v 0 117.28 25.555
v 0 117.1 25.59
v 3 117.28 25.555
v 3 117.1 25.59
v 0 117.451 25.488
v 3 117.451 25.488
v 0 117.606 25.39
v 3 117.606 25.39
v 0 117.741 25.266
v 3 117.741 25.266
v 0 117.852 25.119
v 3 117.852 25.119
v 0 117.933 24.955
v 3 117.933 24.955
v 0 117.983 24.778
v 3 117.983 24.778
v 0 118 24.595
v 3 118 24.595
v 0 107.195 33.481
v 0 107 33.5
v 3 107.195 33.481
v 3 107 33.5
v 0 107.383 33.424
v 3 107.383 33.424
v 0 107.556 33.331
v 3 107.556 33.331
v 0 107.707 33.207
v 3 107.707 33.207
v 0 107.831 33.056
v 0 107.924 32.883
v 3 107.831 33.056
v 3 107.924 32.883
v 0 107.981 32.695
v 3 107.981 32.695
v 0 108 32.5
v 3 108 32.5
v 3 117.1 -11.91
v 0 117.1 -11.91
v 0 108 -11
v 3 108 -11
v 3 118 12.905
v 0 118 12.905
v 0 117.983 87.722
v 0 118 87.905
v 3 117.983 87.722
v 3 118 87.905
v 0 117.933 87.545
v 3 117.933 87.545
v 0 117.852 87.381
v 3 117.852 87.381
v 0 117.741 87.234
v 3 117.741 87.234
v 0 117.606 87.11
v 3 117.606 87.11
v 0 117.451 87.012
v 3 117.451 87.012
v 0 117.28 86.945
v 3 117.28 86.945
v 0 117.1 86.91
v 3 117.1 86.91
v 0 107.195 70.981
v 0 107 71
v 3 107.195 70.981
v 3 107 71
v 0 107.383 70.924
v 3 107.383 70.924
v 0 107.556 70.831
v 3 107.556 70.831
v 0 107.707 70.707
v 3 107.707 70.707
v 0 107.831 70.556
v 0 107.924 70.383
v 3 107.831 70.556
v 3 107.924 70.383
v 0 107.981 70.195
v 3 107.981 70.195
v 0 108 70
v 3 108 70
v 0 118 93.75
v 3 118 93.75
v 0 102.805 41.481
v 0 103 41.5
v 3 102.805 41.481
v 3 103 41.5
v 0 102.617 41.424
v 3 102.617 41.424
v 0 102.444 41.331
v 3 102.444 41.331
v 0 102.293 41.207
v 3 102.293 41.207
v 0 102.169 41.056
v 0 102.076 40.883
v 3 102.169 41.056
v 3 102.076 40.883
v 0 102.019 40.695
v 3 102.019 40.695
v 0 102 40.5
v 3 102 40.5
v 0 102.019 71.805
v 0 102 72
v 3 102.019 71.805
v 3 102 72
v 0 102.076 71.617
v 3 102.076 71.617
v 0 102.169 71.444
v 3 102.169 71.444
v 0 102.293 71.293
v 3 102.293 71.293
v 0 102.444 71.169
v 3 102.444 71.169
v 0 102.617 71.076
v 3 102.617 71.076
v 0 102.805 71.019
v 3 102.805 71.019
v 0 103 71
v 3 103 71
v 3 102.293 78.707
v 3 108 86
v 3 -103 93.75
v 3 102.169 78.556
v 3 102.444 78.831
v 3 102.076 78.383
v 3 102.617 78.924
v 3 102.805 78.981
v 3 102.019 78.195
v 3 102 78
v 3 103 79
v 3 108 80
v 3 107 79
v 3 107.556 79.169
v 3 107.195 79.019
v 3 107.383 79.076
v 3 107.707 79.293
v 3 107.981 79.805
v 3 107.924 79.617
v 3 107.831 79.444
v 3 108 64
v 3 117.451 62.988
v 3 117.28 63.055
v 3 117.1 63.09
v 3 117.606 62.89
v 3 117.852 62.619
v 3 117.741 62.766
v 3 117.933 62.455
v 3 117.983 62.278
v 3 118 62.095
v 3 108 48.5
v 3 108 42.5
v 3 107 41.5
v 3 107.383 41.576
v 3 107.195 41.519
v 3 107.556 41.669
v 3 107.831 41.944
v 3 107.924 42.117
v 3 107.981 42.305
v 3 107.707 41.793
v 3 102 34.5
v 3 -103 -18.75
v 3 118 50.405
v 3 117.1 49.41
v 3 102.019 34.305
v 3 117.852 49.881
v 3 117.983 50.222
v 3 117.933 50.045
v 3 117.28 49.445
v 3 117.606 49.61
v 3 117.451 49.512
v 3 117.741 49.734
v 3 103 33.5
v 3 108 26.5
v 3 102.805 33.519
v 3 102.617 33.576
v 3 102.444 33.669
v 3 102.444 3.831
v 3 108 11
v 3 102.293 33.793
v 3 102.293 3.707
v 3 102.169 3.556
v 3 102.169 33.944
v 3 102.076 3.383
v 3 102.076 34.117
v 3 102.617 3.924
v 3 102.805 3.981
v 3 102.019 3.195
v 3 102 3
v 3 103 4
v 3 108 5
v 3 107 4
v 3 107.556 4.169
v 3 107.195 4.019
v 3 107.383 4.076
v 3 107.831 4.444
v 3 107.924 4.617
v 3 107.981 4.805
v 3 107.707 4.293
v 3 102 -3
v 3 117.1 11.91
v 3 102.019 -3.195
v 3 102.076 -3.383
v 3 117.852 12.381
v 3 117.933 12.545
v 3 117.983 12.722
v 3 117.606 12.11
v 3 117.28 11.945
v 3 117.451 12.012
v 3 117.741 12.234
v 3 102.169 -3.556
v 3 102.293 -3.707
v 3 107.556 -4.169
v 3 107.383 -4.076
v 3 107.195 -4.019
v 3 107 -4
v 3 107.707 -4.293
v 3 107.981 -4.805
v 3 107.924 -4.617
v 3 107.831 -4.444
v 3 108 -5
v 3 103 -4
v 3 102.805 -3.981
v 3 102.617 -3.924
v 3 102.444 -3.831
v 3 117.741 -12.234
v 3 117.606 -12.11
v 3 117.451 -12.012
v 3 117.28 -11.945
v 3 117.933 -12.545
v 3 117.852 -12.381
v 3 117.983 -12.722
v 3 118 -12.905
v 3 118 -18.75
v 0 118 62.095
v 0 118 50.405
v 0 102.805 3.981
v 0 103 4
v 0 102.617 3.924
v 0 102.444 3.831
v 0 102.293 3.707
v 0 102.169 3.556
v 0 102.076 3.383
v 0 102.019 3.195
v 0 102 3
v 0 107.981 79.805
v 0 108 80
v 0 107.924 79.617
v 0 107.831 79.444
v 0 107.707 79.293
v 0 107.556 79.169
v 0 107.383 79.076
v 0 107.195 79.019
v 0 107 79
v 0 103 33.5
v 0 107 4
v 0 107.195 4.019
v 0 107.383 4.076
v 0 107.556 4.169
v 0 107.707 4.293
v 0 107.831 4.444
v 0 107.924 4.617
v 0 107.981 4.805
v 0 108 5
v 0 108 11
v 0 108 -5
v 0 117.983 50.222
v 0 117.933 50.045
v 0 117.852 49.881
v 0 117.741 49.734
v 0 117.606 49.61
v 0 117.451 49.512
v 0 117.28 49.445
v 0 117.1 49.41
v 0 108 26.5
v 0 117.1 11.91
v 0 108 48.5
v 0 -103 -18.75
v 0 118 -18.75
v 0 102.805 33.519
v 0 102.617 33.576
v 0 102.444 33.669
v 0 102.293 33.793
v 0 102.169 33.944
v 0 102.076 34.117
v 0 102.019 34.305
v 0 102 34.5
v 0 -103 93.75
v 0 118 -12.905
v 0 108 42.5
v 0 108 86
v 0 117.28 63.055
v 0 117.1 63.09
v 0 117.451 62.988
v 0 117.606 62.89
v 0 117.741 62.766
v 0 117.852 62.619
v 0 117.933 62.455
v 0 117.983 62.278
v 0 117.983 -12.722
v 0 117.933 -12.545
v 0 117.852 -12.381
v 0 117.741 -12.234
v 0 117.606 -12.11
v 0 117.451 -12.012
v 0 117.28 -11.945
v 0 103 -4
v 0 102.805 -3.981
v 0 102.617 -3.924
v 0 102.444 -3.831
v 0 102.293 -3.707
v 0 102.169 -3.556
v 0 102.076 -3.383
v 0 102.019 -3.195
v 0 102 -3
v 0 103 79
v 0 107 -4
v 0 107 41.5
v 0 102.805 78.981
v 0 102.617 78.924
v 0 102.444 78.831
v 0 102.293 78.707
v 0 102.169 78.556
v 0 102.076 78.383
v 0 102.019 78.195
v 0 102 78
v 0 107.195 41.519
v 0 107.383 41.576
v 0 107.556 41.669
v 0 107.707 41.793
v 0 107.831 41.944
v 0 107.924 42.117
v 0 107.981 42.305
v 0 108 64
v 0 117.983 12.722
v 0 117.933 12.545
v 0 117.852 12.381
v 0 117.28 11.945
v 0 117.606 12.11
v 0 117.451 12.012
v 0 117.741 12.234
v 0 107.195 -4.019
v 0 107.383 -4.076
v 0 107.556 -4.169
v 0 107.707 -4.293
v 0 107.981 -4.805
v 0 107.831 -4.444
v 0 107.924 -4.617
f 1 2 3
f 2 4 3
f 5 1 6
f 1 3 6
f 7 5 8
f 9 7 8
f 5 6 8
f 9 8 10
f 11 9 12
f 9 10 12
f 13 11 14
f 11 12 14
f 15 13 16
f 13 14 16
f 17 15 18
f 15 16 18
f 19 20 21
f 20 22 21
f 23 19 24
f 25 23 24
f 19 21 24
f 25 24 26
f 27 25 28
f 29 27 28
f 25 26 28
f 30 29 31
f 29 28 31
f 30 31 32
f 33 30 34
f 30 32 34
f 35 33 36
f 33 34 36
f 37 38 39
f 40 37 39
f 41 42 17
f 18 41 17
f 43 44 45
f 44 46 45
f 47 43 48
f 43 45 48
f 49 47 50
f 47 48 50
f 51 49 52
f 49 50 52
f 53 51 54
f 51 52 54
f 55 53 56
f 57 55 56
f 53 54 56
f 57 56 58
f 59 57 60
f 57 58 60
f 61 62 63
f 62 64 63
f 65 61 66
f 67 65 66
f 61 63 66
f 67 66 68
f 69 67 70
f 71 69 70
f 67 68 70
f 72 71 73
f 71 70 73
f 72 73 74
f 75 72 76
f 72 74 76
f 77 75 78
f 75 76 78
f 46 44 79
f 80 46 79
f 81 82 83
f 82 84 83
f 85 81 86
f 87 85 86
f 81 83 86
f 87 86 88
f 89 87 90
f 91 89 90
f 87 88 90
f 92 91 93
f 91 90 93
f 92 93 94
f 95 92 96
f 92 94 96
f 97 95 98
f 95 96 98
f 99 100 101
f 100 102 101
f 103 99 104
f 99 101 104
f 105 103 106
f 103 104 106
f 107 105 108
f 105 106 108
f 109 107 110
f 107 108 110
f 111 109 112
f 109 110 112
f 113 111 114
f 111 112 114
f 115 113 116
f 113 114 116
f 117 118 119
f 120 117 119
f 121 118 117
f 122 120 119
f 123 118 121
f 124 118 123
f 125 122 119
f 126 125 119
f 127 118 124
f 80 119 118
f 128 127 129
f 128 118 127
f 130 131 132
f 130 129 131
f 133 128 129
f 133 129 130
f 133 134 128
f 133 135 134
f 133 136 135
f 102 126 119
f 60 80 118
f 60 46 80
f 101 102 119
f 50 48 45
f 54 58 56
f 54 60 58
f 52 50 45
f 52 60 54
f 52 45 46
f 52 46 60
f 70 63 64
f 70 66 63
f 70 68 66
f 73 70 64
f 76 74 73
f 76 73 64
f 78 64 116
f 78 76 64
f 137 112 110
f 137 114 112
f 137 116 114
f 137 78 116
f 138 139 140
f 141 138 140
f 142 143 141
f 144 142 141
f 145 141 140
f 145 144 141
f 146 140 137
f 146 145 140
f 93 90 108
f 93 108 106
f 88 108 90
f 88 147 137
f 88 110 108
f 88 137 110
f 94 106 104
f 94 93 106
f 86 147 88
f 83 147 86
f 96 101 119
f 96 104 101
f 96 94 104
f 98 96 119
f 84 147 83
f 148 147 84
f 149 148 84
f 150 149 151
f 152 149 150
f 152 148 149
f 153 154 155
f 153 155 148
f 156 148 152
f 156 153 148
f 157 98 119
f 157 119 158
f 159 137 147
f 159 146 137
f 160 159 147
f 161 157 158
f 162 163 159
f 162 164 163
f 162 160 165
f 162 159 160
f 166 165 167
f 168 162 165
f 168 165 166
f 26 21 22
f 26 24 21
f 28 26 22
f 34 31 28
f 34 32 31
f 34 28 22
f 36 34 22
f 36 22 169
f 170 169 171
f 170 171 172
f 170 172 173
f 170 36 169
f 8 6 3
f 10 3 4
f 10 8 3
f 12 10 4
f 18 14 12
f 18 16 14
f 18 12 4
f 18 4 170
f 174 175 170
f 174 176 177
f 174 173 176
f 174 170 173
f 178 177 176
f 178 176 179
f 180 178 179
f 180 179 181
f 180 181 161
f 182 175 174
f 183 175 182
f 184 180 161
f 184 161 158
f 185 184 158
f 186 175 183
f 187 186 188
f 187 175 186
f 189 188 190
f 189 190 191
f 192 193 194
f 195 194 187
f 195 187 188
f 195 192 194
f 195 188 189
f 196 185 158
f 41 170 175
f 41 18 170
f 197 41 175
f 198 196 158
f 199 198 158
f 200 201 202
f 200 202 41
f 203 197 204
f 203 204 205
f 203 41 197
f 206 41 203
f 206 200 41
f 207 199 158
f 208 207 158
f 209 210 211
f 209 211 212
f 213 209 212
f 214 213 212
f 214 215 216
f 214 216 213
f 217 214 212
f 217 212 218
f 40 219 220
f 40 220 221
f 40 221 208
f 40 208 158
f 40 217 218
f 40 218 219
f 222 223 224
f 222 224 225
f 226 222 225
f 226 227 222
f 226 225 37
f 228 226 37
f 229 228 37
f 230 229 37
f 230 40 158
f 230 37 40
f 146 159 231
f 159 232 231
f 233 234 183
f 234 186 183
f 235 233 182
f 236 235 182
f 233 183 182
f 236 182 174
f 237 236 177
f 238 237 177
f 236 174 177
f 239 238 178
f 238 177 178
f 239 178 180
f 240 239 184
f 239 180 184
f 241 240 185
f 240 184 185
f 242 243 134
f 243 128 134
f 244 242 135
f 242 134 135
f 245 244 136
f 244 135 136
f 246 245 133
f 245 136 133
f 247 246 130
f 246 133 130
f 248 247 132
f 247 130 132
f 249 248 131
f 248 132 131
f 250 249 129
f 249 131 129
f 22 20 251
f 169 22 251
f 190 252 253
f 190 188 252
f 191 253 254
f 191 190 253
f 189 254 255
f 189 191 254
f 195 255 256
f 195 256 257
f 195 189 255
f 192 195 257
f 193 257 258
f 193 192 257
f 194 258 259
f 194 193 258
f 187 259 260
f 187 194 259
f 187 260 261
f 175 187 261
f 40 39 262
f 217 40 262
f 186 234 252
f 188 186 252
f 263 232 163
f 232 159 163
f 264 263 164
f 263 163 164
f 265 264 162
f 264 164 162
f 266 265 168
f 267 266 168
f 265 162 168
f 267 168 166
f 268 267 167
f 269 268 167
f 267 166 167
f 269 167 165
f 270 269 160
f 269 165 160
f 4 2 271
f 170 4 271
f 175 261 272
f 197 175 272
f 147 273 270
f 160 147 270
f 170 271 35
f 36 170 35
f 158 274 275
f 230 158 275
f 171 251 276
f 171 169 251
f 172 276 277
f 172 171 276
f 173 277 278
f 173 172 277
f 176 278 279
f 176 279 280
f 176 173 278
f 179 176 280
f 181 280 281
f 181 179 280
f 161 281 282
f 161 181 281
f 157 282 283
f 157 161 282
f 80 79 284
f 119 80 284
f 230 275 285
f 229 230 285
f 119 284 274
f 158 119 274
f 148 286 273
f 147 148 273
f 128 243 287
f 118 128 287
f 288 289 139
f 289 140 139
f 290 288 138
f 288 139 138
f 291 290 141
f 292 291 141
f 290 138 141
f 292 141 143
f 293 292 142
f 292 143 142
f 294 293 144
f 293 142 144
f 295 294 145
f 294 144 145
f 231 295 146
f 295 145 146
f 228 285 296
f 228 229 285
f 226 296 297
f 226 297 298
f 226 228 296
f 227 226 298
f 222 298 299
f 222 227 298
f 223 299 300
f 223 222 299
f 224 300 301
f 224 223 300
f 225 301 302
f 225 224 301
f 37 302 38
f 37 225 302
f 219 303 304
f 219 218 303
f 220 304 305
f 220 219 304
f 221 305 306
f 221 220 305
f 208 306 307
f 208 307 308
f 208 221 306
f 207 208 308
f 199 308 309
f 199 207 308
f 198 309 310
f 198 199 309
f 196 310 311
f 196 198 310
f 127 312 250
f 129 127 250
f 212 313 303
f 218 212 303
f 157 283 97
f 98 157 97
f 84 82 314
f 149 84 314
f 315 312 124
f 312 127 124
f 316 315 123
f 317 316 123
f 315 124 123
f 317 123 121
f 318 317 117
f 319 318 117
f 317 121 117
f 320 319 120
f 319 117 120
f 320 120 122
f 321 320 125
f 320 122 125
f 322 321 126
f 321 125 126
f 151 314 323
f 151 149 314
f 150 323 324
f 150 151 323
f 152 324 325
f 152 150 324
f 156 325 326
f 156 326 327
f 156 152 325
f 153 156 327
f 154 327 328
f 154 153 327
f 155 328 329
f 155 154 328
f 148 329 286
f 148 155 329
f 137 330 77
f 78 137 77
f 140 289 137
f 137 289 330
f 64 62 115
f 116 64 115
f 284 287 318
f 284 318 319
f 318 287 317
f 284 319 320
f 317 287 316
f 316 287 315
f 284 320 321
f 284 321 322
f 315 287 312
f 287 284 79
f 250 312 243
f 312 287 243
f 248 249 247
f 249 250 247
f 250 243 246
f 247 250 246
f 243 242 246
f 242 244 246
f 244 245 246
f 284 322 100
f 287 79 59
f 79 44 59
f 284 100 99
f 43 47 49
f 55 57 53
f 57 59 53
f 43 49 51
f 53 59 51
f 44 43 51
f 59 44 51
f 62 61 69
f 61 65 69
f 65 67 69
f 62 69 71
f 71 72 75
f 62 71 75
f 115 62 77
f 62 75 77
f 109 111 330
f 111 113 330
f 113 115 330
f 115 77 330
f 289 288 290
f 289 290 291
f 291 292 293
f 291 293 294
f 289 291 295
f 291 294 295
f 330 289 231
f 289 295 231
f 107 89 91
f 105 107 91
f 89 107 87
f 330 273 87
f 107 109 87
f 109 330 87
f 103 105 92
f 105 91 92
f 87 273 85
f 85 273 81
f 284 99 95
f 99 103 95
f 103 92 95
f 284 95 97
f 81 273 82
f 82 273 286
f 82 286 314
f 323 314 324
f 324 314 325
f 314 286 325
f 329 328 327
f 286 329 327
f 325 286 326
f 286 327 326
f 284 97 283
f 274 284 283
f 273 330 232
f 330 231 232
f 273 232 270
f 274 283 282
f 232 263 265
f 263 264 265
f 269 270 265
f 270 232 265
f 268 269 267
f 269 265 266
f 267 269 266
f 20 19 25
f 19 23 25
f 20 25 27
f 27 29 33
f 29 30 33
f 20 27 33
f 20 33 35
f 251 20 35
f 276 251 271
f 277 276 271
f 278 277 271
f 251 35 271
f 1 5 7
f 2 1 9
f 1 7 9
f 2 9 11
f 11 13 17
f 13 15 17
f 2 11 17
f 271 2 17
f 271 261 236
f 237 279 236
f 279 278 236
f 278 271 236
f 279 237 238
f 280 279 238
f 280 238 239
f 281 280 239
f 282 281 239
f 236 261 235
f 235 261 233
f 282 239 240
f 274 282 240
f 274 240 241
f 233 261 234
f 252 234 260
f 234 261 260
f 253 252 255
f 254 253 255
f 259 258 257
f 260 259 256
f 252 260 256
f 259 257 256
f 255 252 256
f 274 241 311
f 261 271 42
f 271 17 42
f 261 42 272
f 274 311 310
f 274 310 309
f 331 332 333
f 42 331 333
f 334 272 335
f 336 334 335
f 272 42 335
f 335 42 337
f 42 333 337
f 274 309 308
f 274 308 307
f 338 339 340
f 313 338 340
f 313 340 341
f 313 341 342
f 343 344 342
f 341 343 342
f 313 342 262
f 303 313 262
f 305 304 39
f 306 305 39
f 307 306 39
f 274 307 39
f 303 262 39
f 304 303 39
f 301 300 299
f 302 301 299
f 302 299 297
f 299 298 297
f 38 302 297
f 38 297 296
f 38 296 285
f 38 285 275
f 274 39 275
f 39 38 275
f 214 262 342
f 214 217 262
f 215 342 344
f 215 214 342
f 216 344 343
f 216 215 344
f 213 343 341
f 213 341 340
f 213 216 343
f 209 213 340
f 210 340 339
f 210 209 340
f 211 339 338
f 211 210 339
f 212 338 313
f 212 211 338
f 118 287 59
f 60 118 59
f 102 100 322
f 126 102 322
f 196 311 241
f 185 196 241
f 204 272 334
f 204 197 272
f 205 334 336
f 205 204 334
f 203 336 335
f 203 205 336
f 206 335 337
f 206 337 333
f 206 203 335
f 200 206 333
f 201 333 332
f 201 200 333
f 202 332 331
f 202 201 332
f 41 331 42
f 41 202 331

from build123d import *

# Parameters (mm, degrees)
BOSS_EXTRUDE2_DEPTH    = 3
FILLET1_R              = 1
LPATTERN1_COUNT        = 3
LPATTERN1_PITCH        = 37.5
FILLET1_OF_LPATTERN1_R = 1


with BuildPart() as part:
    # Sketch2 → Boss-Extrude2 (new body)
    with BuildSketch(Plane(origin=(0, 0, 0), x_dir=(0, 0, -1), z_dir=(1, 0, 0))):
        Polygon((-4, 102), (-4, 108), (-11, 108), (-12, 118), (-18.75, 118), (-18.75, -103), (18.75, -103), (18.75, 118), (12, 118), (11, 108), (4, 108), (4, 102), align=None)
    boss_extrude2 = extrude(amount=BOSS_EXTRUDE2_DEPTH)

    # Fillet1
    fillet1_edges = [part.edges().sort_by_distance(p)[0] for p in [
        (1.5, 108, -4),
        (1.5, 118, -12),
        (1.5, 118, 12),
        (1.5, 108, 4),
        (1.5, 102, 4),
        (1.5, 102, -4),
    ]]
    fillet(fillet1_edges, radius=FILLET1_R)

    # LPattern1: Boss-Extrude2 ×3
    with Locations(*[(0, 0, i * LPATTERN1_PITCH) for i in range(1, LPATTERN1_COUNT)]):
        add(boss_extrude2)

    # Fillet1 of LPattern1
    fillet1_of_lpattern1_edges = [part.edges().sort_by_distance(p)[0] for p in [
        (1.5, 108, 33.5),
        (1.5, 118, 25.5),
        (1.5, 118, 49.5),
        (1.5, 108, 41.5),
        (1.5, 102, 41.5),
        (1.5, 102, 33.5),
        (1.5, 108, 71),
        (1.5, 118, 63),
        (1.5, 118, 87),
        (1.5, 108, 79),
        (1.5, 102, 79),
        (1.5, 102, 71),
    ]]
    fillet(fillet1_of_lpattern1_edges, radius=FILLET1_OF_LPATTERN1_R)


solid = part.part
